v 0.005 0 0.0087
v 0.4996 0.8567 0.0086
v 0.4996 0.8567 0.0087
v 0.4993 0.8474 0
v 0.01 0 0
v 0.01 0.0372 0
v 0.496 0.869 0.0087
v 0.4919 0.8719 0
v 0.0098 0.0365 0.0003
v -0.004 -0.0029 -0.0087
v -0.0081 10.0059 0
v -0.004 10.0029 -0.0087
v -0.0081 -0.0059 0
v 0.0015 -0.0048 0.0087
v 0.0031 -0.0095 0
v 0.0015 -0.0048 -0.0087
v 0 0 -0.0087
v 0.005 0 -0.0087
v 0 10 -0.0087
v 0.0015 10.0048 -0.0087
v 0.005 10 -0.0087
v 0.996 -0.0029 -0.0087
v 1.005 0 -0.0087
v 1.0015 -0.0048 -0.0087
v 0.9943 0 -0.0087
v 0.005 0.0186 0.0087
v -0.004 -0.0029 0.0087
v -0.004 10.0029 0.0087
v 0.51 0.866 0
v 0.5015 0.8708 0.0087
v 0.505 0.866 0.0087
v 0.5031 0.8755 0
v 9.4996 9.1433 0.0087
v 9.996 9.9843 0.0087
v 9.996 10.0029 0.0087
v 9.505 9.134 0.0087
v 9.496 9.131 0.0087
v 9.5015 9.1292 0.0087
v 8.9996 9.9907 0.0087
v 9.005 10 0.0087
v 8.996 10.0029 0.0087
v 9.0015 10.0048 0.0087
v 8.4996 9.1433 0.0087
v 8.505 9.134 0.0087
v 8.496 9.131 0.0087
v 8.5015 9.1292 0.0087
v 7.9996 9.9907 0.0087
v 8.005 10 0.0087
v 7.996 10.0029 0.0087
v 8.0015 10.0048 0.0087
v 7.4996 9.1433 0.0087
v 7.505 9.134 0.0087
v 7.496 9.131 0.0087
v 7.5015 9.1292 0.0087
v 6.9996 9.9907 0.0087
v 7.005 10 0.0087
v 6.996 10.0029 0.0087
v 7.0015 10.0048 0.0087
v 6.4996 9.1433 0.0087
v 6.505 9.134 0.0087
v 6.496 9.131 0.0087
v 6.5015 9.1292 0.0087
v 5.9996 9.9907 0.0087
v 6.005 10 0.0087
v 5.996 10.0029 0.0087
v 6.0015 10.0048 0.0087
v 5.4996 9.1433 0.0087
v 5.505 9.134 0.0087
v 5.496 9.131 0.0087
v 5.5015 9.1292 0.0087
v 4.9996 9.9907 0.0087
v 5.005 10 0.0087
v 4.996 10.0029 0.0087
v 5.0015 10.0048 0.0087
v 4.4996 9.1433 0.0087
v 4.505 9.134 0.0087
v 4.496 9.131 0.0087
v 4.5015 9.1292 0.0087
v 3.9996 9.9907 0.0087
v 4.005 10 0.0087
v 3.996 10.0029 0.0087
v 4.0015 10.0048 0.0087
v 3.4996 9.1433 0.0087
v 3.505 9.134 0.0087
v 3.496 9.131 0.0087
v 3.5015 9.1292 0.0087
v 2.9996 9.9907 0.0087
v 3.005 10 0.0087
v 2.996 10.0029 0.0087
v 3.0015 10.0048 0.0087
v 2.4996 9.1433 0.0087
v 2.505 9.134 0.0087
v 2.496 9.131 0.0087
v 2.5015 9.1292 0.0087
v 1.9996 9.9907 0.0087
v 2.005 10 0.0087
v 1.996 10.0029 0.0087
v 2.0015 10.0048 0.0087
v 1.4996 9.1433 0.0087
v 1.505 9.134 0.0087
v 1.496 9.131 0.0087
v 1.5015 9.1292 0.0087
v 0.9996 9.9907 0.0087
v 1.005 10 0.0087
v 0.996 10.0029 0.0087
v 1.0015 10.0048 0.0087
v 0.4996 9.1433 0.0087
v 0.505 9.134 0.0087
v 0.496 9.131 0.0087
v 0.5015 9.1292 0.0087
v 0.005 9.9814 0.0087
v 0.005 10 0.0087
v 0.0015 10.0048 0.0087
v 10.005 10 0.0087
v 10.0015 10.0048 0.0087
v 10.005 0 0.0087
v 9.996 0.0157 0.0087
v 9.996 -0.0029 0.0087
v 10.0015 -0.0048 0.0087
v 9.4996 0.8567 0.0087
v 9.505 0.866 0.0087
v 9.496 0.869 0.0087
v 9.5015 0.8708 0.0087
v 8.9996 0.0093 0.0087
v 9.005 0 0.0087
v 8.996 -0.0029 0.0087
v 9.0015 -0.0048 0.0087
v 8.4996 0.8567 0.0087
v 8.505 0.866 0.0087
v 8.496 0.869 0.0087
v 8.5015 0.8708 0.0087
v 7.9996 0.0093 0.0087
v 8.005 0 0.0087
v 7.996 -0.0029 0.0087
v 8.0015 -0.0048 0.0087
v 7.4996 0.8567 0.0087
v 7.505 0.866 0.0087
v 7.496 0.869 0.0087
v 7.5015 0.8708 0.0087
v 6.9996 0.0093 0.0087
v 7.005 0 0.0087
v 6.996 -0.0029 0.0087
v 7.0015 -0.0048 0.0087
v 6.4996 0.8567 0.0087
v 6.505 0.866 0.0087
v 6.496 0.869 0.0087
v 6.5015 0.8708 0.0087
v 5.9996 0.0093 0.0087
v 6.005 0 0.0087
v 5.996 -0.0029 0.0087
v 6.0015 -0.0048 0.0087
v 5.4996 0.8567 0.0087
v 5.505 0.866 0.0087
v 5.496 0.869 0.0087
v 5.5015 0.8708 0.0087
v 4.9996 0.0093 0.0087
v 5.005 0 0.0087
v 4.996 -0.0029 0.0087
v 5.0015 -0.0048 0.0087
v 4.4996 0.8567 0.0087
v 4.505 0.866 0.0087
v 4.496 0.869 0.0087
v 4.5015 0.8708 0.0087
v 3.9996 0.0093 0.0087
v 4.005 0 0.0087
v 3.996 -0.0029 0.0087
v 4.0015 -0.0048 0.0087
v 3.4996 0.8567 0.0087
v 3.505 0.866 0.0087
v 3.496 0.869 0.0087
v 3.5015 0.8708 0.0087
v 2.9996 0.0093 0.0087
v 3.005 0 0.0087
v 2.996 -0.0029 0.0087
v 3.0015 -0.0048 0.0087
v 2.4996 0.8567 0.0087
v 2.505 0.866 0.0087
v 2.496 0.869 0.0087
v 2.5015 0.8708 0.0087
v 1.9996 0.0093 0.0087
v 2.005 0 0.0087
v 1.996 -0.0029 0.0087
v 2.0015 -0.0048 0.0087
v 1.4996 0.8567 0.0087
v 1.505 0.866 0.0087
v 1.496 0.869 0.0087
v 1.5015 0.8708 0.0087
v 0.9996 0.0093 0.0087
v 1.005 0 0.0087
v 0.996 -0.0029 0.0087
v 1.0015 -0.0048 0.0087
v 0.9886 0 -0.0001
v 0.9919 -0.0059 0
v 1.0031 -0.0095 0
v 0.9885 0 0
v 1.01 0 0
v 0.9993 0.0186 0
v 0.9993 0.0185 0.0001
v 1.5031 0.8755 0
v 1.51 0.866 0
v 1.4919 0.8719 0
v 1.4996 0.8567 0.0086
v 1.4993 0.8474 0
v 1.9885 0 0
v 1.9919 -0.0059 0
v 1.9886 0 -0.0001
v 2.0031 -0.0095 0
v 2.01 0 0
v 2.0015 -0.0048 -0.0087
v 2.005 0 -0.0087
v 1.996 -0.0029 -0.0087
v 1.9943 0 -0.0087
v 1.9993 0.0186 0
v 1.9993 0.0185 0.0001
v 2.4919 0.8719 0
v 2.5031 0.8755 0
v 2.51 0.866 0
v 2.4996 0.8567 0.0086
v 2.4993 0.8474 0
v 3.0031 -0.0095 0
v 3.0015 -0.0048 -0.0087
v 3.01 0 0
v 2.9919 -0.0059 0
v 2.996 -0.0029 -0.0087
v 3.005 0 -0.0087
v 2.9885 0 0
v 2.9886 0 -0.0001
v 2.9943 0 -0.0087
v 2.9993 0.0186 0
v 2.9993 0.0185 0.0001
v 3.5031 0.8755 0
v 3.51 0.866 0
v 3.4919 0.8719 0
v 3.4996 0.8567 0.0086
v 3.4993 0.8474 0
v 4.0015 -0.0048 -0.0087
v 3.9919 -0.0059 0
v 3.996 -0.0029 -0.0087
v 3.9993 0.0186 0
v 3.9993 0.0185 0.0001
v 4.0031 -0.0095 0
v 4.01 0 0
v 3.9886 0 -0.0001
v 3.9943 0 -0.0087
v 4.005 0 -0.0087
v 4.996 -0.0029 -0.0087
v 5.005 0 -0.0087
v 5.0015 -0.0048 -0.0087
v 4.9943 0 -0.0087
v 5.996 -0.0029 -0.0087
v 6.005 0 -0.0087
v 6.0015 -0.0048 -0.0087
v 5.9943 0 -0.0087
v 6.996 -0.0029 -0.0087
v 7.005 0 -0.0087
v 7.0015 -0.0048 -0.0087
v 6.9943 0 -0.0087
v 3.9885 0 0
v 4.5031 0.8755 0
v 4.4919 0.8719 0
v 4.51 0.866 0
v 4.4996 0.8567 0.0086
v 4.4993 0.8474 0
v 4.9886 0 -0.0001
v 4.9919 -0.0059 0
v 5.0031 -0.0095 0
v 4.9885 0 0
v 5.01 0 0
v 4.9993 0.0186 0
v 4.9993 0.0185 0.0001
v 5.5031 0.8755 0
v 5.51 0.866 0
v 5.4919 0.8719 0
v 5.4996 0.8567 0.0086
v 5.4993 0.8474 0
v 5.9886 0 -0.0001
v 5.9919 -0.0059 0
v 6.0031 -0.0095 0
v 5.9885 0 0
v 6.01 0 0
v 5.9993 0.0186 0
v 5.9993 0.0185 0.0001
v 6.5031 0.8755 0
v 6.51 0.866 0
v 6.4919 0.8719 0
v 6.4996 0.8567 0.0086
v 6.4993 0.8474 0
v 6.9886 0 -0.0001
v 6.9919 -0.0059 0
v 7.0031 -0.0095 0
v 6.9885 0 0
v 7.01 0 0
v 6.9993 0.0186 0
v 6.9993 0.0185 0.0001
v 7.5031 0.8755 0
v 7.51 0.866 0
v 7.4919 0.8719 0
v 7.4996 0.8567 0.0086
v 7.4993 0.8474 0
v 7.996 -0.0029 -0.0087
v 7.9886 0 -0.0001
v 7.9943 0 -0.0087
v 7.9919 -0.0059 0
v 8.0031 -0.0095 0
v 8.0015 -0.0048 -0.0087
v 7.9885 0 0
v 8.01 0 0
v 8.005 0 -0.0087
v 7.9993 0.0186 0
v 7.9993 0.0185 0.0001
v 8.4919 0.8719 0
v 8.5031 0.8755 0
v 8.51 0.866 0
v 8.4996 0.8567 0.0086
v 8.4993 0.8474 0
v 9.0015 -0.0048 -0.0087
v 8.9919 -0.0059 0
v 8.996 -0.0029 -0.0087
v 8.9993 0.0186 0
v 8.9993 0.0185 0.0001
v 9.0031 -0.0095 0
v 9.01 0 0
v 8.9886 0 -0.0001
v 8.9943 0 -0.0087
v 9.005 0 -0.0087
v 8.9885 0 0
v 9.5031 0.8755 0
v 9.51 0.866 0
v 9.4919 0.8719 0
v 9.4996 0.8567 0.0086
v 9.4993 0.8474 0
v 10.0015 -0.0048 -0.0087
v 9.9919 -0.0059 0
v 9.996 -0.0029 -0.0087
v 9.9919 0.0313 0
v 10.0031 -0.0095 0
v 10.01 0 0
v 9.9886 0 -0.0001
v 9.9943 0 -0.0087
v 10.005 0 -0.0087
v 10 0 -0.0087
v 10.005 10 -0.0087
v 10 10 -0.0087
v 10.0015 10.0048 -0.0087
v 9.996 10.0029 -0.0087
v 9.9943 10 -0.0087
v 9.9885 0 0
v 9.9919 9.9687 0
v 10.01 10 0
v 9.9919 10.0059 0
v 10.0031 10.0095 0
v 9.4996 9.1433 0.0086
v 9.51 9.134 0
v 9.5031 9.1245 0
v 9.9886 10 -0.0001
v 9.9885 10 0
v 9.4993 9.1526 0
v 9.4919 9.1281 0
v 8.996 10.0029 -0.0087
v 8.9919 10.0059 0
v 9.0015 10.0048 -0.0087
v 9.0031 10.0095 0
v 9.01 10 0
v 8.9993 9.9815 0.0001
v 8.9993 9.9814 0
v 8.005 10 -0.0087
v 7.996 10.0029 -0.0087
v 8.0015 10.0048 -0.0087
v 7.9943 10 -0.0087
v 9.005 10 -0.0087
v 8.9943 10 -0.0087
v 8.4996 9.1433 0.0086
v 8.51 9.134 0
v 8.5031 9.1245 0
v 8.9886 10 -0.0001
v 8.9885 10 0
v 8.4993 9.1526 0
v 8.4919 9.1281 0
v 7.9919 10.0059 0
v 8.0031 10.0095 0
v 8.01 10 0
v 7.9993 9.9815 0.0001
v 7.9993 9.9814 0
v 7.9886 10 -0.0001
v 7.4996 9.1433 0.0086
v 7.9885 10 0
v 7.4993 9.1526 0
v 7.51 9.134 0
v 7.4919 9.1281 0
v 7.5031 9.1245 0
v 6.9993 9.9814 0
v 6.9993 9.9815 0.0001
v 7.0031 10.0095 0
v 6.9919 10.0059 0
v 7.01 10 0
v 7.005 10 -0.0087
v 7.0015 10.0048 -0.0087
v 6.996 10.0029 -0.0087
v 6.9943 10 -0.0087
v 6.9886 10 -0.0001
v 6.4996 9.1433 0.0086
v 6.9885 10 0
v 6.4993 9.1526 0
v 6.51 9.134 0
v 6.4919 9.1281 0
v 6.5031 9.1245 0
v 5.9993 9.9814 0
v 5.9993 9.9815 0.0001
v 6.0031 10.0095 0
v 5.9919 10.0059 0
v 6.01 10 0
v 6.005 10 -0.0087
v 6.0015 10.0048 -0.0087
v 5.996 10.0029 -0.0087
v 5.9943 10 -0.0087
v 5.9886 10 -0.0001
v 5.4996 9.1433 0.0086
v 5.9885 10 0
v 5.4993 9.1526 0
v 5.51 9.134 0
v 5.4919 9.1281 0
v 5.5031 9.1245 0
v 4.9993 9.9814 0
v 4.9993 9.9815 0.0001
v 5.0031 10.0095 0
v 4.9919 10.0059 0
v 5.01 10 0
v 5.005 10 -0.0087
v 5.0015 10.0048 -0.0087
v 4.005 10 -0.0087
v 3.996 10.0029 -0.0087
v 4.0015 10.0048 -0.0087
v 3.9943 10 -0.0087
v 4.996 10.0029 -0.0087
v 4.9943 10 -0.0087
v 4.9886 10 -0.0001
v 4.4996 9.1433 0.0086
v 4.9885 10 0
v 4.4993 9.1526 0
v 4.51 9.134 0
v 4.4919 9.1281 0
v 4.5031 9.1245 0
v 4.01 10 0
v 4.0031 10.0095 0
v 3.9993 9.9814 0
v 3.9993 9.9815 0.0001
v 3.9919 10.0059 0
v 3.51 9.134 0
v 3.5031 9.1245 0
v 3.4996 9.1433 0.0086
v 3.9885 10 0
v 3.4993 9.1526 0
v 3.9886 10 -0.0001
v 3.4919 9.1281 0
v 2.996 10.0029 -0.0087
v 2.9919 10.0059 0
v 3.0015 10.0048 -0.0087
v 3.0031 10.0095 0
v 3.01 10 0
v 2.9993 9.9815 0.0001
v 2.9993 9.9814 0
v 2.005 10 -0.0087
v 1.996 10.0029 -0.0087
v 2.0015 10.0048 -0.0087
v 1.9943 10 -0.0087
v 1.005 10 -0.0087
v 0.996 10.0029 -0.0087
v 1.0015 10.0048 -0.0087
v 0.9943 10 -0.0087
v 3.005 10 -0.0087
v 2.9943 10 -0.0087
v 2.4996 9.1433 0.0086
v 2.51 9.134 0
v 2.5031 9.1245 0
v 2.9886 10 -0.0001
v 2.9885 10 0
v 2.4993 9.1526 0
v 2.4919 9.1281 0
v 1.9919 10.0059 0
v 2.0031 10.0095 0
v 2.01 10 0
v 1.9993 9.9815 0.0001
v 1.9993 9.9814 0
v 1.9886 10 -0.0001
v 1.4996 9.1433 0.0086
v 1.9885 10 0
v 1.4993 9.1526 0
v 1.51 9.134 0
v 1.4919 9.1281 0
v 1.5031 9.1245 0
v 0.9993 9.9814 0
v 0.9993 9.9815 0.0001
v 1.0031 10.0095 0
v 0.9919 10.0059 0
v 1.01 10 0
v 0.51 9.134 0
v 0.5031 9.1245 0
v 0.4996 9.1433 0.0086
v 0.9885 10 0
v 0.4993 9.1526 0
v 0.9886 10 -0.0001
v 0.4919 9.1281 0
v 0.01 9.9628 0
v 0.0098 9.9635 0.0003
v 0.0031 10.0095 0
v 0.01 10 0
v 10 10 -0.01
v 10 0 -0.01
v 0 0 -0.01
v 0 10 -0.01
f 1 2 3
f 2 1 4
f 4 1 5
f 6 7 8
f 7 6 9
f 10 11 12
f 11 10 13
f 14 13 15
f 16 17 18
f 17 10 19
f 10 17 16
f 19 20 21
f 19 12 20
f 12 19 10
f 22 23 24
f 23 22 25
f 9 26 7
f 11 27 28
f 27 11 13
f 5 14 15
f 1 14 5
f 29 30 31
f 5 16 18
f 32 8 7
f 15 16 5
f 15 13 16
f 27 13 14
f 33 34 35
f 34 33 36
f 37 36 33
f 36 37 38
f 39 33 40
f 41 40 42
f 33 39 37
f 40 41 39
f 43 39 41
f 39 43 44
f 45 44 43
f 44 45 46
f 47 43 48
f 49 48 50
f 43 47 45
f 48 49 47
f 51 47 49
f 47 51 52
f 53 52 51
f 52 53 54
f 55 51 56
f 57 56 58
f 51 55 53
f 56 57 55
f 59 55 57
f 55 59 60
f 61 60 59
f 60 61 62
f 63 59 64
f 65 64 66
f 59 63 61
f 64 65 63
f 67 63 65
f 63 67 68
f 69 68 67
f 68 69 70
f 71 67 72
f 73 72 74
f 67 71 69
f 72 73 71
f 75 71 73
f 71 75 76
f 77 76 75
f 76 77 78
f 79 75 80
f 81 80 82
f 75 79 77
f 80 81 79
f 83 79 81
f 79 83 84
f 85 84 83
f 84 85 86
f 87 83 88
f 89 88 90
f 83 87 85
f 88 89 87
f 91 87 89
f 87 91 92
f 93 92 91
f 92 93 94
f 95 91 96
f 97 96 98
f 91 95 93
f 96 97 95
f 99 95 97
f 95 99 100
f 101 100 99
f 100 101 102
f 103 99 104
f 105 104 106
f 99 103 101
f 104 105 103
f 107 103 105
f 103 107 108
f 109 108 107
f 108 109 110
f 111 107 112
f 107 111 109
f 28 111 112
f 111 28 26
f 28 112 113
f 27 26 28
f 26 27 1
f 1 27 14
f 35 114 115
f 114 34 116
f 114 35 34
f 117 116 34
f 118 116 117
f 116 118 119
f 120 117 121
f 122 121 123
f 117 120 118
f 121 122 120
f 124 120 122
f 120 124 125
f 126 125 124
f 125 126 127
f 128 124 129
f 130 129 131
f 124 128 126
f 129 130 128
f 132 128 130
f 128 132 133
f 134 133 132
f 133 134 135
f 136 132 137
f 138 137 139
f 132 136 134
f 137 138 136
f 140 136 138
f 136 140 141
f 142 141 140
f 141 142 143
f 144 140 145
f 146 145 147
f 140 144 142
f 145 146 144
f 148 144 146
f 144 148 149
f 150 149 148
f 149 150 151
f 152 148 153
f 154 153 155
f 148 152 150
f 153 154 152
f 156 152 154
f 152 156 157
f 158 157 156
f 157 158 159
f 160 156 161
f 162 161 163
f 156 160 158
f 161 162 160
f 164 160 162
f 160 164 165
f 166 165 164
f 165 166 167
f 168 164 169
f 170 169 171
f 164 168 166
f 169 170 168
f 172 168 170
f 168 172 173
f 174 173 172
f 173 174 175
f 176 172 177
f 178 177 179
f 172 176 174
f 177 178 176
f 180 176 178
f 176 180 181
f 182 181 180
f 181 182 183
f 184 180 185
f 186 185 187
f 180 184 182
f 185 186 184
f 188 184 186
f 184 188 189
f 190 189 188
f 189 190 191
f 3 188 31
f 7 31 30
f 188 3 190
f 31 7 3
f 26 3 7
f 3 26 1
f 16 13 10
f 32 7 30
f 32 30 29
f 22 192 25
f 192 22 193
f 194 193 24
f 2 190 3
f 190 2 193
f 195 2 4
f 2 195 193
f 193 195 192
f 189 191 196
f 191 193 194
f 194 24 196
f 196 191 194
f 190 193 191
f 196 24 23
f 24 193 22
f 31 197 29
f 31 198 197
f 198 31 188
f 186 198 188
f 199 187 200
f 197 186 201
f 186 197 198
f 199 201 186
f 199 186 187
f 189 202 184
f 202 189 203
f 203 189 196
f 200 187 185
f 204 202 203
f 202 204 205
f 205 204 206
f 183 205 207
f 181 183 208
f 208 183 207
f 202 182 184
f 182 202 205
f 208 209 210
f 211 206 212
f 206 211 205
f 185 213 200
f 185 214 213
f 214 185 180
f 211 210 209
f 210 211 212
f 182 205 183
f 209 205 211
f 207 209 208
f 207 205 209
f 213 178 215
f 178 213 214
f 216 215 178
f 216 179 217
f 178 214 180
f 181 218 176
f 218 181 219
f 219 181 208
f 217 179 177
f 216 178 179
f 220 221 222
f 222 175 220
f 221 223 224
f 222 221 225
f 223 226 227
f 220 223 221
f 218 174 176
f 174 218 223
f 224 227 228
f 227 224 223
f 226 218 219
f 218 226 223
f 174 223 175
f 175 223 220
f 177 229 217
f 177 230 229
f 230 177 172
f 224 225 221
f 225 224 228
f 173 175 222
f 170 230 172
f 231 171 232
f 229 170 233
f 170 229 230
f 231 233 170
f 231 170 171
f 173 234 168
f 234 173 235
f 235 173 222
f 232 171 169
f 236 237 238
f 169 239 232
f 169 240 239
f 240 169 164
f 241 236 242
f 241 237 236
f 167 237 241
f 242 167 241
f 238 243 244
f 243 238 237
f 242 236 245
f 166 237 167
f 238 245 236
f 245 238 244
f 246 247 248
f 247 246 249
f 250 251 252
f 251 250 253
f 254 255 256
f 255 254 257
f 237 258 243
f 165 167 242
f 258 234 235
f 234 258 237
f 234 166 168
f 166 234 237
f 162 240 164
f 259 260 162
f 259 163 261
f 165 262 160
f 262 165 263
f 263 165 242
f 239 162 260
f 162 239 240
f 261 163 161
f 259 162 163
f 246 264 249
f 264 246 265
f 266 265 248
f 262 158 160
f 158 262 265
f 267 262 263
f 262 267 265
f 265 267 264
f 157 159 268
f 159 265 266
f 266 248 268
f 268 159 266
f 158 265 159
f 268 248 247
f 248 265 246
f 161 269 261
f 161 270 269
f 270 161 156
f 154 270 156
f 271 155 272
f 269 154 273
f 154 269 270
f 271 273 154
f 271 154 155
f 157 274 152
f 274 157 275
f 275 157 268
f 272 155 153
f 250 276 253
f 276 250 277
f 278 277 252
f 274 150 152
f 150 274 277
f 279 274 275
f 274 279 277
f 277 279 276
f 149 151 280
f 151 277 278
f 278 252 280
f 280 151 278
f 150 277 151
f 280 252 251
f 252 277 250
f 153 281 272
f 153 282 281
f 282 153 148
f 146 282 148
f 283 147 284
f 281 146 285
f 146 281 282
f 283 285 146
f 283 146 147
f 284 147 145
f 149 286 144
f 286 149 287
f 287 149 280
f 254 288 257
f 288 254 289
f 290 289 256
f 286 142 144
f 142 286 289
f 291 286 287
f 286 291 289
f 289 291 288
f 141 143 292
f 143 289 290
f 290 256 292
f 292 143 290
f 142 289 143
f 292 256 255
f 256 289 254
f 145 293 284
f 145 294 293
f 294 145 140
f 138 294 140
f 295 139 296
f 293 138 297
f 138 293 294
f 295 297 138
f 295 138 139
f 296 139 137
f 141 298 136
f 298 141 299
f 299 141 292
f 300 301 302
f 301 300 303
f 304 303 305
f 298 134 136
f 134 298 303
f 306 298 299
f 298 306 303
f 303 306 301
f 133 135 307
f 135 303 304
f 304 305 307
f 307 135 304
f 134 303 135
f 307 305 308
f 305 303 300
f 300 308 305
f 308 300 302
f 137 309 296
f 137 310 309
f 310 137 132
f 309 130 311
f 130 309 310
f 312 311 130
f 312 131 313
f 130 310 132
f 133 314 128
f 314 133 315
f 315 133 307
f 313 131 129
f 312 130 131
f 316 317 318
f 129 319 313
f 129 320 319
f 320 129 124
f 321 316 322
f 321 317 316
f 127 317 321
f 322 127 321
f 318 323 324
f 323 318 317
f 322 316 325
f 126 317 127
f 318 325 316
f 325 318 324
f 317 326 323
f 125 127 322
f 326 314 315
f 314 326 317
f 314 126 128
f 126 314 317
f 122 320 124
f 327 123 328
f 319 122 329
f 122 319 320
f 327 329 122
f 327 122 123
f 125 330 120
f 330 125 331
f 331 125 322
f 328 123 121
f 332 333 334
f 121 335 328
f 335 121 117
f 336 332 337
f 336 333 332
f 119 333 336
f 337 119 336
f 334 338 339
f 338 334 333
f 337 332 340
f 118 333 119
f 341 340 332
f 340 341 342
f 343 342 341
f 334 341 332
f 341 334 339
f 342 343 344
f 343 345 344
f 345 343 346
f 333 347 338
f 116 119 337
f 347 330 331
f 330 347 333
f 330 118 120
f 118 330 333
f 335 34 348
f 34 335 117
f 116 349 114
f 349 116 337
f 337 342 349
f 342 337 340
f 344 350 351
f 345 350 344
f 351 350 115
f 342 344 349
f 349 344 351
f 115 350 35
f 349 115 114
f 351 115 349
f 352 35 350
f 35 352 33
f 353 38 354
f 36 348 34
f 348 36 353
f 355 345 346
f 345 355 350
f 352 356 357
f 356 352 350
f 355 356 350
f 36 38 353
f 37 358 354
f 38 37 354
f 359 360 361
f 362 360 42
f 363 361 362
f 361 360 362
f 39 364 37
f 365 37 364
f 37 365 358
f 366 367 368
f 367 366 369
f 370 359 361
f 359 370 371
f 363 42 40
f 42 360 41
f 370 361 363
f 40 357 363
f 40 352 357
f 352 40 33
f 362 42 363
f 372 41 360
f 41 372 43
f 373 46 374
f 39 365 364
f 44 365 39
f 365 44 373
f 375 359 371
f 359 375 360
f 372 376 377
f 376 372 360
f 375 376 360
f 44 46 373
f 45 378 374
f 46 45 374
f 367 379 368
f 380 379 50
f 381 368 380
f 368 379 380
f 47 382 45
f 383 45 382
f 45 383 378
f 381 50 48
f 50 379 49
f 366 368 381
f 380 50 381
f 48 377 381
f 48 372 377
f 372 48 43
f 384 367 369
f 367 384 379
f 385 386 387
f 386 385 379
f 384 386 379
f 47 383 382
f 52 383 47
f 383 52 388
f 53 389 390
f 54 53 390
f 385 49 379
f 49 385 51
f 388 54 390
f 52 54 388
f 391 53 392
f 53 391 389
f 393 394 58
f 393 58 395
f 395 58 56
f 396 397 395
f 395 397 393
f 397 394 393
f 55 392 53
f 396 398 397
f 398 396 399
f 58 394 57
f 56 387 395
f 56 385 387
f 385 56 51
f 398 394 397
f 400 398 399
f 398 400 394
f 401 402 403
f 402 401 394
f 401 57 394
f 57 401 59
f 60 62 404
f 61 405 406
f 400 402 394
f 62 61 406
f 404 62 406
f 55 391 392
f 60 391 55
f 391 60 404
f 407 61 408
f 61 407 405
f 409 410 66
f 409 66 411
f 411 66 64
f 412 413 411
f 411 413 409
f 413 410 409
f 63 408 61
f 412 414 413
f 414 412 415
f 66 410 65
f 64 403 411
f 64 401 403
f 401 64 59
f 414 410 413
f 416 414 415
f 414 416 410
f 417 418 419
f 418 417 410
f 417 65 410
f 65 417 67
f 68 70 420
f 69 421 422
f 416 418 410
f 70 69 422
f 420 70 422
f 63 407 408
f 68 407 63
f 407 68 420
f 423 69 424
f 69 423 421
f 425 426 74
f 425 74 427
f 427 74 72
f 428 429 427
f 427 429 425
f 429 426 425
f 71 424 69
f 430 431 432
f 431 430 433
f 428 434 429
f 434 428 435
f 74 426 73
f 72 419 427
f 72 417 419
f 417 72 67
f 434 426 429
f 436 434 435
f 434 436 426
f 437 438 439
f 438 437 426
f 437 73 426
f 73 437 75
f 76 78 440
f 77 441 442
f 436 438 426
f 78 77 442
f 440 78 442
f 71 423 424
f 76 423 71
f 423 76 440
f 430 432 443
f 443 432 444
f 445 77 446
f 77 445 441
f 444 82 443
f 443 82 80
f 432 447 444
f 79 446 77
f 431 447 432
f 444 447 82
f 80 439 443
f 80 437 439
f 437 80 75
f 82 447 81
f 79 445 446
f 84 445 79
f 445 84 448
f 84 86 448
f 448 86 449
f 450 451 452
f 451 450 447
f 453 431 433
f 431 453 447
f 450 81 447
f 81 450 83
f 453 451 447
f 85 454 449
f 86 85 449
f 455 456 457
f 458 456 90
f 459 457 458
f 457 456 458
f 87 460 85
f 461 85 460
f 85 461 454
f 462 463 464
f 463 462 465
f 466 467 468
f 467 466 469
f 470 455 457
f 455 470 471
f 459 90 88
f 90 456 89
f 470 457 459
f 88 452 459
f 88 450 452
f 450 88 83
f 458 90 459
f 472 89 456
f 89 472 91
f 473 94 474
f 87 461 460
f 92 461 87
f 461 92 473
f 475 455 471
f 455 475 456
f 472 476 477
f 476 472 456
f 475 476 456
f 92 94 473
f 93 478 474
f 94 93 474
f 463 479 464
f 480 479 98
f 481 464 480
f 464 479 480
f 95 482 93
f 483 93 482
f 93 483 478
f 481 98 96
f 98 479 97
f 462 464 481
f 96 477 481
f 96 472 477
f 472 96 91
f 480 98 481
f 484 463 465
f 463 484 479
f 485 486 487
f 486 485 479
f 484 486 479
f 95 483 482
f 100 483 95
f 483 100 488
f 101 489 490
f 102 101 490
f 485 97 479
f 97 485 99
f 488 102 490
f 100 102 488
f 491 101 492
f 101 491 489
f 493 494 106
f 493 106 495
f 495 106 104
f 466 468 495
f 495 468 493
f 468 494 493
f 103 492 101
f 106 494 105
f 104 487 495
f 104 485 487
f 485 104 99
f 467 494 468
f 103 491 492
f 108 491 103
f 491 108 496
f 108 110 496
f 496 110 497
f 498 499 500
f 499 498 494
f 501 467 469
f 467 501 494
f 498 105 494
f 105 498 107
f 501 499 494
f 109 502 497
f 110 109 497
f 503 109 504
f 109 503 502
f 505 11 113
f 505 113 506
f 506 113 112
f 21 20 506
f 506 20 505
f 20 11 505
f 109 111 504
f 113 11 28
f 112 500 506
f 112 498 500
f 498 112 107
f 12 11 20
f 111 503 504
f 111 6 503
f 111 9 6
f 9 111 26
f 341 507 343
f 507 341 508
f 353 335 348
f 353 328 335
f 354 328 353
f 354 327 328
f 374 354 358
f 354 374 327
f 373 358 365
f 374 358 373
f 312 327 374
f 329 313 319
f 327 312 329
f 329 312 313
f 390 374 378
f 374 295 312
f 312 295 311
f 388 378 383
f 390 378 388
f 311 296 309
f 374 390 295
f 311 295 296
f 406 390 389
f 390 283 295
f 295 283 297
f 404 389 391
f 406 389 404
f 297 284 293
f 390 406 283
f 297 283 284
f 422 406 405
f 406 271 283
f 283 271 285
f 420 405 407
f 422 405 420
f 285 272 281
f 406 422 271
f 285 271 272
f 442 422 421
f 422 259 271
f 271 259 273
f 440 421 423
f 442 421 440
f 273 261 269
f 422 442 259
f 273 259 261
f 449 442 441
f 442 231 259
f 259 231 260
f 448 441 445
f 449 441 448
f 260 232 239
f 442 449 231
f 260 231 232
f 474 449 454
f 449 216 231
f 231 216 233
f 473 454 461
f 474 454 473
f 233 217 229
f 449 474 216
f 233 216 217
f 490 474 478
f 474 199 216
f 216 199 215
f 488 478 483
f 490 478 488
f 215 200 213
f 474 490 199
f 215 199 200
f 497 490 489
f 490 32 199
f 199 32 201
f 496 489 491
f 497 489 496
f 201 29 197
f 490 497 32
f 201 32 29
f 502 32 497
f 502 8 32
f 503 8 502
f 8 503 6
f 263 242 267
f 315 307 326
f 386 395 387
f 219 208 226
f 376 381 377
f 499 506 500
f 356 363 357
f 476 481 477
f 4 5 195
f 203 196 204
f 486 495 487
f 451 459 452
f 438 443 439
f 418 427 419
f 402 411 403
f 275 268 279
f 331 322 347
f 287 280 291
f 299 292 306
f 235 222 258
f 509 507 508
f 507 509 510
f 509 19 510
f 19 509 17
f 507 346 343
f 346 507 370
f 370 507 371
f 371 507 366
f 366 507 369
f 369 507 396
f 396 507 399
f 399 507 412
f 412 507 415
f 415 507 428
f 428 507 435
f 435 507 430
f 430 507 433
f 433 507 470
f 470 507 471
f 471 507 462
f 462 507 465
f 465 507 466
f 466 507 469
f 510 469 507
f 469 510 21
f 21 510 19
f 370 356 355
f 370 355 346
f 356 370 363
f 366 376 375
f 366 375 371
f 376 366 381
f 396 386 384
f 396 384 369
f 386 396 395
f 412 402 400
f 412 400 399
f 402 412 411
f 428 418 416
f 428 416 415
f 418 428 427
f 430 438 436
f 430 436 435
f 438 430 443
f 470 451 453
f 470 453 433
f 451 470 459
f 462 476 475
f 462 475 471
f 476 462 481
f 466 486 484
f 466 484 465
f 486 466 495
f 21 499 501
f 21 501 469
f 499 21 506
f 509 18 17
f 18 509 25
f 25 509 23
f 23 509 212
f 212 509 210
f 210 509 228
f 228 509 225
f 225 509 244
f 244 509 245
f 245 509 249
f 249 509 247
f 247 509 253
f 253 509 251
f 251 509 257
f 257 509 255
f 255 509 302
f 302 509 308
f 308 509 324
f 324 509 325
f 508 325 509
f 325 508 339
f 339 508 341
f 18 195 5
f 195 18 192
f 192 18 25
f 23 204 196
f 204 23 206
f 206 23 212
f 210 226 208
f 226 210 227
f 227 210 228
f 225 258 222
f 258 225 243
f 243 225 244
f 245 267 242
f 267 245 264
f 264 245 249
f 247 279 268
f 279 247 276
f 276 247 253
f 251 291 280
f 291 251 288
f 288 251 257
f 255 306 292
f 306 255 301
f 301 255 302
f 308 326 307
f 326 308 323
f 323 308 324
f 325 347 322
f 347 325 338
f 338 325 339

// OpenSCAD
hull(){
    translate([0.0, 0.0]) sphere(0.01);
    translate([0.5, 0.8660254037844386]) sphere(0.01);
}
hull(){
    translate([0.5, 0.8660254037844386]) sphere(0.01);
    translate([1.0, 0.0]) sphere(0.01);
}
hull(){
    translate([1.0, 0.0]) sphere(0.01);
    translate([1.5, 0.8660254037844386]) sphere(0.01);
}
hull(){
    translate([1.5, 0.8660254037844386]) sphere(0.01);
    translate([2.0, 0.0]) sphere(0.01);
}
hull(){
    translate([2.0, 0.0]) sphere(0.01);
    translate([2.5, 0.8660254037844386]) sphere(0.01);
}
hull(){
    translate([2.5, 0.8660254037844386]) sphere(0.01);
    translate([3.0, 0.0]) sphere(0.01);
}
hull(){
    translate([3.0, 0.0]) sphere(0.01);
    translate([3.5, 0.8660254037844386]) sphere(0.01);
}
hull(){
    translate([3.5, 0.8660254037844386]) sphere(0.01);
    translate([4.0, 0.0]) sphere(0.01);
}
hull(){
    translate([4.0, 0.0]) sphere(0.01);
    translate([4.5, 0.8660254037844386]) sphere(0.01);
}
hull(){
    translate([4.5, 0.8660254037844386]) sphere(0.01);
    translate([5.0, 0.0]) sphere(0.01);
}
hull(){
    translate([5.0, 0.0]) sphere(0.01);
    translate([5.5, 0.8660254037844386]) sphere(0.01);
}
hull(){
    translate([5.5, 0.8660254037844386]) sphere(0.01);
    translate([6.0, 0.0]) sphere(0.01);
}
hull(){
    translate([6.0, 0.0]) sphere(0.01);
    translate([6.5, 0.8660254037844386]) sphere(0.01);
}
hull(){
    translate([6.5, 0.8660254037844386]) sphere(0.01);
    translate([7.0, 0.0]) sphere(0.01);
}
hull(){
    translate([7.0, 0.0]) sphere(0.01);
    translate([7.5, 0.8660254037844386]) sphere(0.01);
}
hull(){
    translate([7.5, 0.8660254037844386]) sphere(0.01);
    translate([8.0, 0.0]) sphere(0.01);
}
hull(){
    translate([8.0, 0.0]) sphere(0.01);
    translate([8.5, 0.8660254037844386]) sphere(0.01);
}
hull(){
    translate([8.5, 0.8660254037844386]) sphere(0.01);
    translate([9.0, 0.0]) sphere(0.01);
}
hull(){
    translate([9.0, 0.0]) sphere(0.01);
    translate([9.5, 0.8660254037844386]) sphere(0.01);
}
hull(){
    translate([9.5, 0.8660254037844386]) sphere(0.01);
    translate([10.0, 0.0]) sphere(0.01);
}
hull(){
    translate([10.0, 0.0]) sphere(0.01);
    translate([10.0, 1.0]) sphere(0.01);
}
hull(){
    translate([10.0, 1.0]) sphere(0.01);
    translate([10.0, 2.0]) sphere(0.01);
}
hull(){
    translate([10.0, 2.0]) sphere(0.01);
    translate([10.0, 3.0]) sphere(0.01);
}
hull(){
    translate([10.0, 3.0]) sphere(0.01);
    translate([10.0, 4.0]) sphere(0.01);
}
hull(){
    translate([10.0, 4.0]) sphere(0.01);
    translate([10.0, 5.0]) sphere(0.01);
}
hull(){
    translate([10.0, 5.0]) sphere(0.01);
    translate([10.0, 6.0]) sphere(0.01);
}
hull(){
    translate([10.0, 6.0]) sphere(0.01);
    translate([10.0, 7.0]) sphere(0.01);
}
hull(){
    translate([10.0, 7.0]) sphere(0.01);
    translate([10.0, 8.0]) sphere(0.01);
}
hull(){
    translate([10.0, 8.0]) sphere(0.01);
    translate([10.0, 9.0]) sphere(0.01);
}
hull(){
    translate([10.0, 9.0]) sphere(0.01);
    translate([10.0, 10.0]) sphere(0.01);
}
hull(){
    translate([10.0, 10.0]) sphere(0.01);
    translate([9.5, 9.133974596215563]) sphere(0.01);
}
hull(){
    translate([9.5, 9.133974596215563]) sphere(0.01);
    translate([9.0, 10.0]) sphere(0.01);
}
hull(){
    translate([9.0, 10.0]) sphere(0.01);
    translate([8.5, 9.133974596215563]) sphere(0.01);
}
hull(){
    translate([8.5, 9.133974596215563]) sphere(0.01);
    translate([8.0, 10.0]) sphere(0.01);
}
hull(){
    translate([8.0, 10.0]) sphere(0.01);
    translate([7.5, 9.133974596215563]) sphere(0.01);
}
hull(){
    translate([7.5, 9.133974596215563]) sphere(0.01);
    translate([7.0, 10.0]) sphere(0.01);
}
hull(){
    translate([7.0, 10.0]) sphere(0.01);
    translate([6.5, 9.133974596215563]) sphere(0.01);
}
hull(){
    translate([6.5, 9.133974596215563]) sphere(0.01);
    translate([6.0, 10.0]) sphere(0.01);
}
hull(){
    translate([6.0, 10.0]) sphere(0.01);
    translate([5.5, 9.133974596215563]) sphere(0.01);
}
hull(){
    translate([5.5, 9.133974596215563]) sphere(0.01);
    translate([5.0, 10.0]) sphere(0.01);
}
hull(){
    translate([5.0, 10.0]) sphere(0.01);
    translate([4.5, 9.133974596215563]) sphere(0.01);
}
hull(){
    translate([4.5, 9.133974596215563]) sphere(0.01);
    translate([4.0, 10.0]) sphere(0.01);
}
hull(){
    translate([4.0, 10.0]) sphere(0.01);
    translate([3.5, 9.133974596215563]) sphere(0.01);
}
hull(){
    translate([3.5, 9.133974596215563]) sphere(0.01);
    translate([3.0, 10.0]) sphere(0.01);
}
hull(){
    translate([3.0, 10.0]) sphere(0.01);
    translate([2.5, 9.133974596215563]) sphere(0.01);
}
hull(){
    translate([2.5, 9.133974596215563]) sphere(0.01);
    translate([2.0, 10.0]) sphere(0.01);
}
hull(){
    translate([2.0, 10.0]) sphere(0.01);
    translate([1.5, 9.133974596215563]) sphere(0.01);
}
hull(){
    translate([1.5, 9.133974596215563]) sphere(0.01);
    translate([1.0, 10.0]) sphere(0.01);
}
hull(){
    translate([1.0, 10.0]) sphere(0.01);
    translate([0.5, 9.133974596215563]) sphere(0.01);
}
hull(){
    translate([0.5, 9.133974596215563]) sphere(0.01);
    translate([0.0, 10.0]) sphere(0.01);
}
hull(){
    translate([0.0, 10.0]) sphere(0.01);
    translate([0.0, 9.0]) sphere(0.01);
}
hull(){
    translate([0.0, 9.0]) sphere(0.01);
    translate([0.0, 8.0]) sphere(0.01);
}
hull(){
    translate([0.0, 8.0]) sphere(0.01);
    translate([0.0, 7.0]) sphere(0.01);
}
hull(){
    translate([0.0, 7.0]) sphere(0.01);
    translate([0.0, 6.0]) sphere(0.01);
}
hull(){
    translate([0.0, 6.0]) sphere(0.01);
    translate([0.0, 5.0]) sphere(0.01);
}
hull(){
    translate([0.0, 5.0]) sphere(0.01);
    translate([0.0, 4.0]) sphere(0.01);
}
hull(){
    translate([0.0, 4.0]) sphere(0.01);
    translate([0.0, 3.0]) sphere(0.01);
}
hull(){
    translate([0.0, 3.0]) sphere(0.01);
    translate([0.0, 2.0]) sphere(0.01);
}
hull(){
    translate([0.0, 2.0]) sphere(0.01);
    translate([0.0, 1.0]) sphere(0.01);
}
hull(){
    translate([0.0, 1.0]) sphere(0.01);
    translate([0.0, 0.0]) sphere(0.01);
}
translate([0,0,-0.01]) color([0.1,0.1,0.1]) cube([10,10,0.01]);
